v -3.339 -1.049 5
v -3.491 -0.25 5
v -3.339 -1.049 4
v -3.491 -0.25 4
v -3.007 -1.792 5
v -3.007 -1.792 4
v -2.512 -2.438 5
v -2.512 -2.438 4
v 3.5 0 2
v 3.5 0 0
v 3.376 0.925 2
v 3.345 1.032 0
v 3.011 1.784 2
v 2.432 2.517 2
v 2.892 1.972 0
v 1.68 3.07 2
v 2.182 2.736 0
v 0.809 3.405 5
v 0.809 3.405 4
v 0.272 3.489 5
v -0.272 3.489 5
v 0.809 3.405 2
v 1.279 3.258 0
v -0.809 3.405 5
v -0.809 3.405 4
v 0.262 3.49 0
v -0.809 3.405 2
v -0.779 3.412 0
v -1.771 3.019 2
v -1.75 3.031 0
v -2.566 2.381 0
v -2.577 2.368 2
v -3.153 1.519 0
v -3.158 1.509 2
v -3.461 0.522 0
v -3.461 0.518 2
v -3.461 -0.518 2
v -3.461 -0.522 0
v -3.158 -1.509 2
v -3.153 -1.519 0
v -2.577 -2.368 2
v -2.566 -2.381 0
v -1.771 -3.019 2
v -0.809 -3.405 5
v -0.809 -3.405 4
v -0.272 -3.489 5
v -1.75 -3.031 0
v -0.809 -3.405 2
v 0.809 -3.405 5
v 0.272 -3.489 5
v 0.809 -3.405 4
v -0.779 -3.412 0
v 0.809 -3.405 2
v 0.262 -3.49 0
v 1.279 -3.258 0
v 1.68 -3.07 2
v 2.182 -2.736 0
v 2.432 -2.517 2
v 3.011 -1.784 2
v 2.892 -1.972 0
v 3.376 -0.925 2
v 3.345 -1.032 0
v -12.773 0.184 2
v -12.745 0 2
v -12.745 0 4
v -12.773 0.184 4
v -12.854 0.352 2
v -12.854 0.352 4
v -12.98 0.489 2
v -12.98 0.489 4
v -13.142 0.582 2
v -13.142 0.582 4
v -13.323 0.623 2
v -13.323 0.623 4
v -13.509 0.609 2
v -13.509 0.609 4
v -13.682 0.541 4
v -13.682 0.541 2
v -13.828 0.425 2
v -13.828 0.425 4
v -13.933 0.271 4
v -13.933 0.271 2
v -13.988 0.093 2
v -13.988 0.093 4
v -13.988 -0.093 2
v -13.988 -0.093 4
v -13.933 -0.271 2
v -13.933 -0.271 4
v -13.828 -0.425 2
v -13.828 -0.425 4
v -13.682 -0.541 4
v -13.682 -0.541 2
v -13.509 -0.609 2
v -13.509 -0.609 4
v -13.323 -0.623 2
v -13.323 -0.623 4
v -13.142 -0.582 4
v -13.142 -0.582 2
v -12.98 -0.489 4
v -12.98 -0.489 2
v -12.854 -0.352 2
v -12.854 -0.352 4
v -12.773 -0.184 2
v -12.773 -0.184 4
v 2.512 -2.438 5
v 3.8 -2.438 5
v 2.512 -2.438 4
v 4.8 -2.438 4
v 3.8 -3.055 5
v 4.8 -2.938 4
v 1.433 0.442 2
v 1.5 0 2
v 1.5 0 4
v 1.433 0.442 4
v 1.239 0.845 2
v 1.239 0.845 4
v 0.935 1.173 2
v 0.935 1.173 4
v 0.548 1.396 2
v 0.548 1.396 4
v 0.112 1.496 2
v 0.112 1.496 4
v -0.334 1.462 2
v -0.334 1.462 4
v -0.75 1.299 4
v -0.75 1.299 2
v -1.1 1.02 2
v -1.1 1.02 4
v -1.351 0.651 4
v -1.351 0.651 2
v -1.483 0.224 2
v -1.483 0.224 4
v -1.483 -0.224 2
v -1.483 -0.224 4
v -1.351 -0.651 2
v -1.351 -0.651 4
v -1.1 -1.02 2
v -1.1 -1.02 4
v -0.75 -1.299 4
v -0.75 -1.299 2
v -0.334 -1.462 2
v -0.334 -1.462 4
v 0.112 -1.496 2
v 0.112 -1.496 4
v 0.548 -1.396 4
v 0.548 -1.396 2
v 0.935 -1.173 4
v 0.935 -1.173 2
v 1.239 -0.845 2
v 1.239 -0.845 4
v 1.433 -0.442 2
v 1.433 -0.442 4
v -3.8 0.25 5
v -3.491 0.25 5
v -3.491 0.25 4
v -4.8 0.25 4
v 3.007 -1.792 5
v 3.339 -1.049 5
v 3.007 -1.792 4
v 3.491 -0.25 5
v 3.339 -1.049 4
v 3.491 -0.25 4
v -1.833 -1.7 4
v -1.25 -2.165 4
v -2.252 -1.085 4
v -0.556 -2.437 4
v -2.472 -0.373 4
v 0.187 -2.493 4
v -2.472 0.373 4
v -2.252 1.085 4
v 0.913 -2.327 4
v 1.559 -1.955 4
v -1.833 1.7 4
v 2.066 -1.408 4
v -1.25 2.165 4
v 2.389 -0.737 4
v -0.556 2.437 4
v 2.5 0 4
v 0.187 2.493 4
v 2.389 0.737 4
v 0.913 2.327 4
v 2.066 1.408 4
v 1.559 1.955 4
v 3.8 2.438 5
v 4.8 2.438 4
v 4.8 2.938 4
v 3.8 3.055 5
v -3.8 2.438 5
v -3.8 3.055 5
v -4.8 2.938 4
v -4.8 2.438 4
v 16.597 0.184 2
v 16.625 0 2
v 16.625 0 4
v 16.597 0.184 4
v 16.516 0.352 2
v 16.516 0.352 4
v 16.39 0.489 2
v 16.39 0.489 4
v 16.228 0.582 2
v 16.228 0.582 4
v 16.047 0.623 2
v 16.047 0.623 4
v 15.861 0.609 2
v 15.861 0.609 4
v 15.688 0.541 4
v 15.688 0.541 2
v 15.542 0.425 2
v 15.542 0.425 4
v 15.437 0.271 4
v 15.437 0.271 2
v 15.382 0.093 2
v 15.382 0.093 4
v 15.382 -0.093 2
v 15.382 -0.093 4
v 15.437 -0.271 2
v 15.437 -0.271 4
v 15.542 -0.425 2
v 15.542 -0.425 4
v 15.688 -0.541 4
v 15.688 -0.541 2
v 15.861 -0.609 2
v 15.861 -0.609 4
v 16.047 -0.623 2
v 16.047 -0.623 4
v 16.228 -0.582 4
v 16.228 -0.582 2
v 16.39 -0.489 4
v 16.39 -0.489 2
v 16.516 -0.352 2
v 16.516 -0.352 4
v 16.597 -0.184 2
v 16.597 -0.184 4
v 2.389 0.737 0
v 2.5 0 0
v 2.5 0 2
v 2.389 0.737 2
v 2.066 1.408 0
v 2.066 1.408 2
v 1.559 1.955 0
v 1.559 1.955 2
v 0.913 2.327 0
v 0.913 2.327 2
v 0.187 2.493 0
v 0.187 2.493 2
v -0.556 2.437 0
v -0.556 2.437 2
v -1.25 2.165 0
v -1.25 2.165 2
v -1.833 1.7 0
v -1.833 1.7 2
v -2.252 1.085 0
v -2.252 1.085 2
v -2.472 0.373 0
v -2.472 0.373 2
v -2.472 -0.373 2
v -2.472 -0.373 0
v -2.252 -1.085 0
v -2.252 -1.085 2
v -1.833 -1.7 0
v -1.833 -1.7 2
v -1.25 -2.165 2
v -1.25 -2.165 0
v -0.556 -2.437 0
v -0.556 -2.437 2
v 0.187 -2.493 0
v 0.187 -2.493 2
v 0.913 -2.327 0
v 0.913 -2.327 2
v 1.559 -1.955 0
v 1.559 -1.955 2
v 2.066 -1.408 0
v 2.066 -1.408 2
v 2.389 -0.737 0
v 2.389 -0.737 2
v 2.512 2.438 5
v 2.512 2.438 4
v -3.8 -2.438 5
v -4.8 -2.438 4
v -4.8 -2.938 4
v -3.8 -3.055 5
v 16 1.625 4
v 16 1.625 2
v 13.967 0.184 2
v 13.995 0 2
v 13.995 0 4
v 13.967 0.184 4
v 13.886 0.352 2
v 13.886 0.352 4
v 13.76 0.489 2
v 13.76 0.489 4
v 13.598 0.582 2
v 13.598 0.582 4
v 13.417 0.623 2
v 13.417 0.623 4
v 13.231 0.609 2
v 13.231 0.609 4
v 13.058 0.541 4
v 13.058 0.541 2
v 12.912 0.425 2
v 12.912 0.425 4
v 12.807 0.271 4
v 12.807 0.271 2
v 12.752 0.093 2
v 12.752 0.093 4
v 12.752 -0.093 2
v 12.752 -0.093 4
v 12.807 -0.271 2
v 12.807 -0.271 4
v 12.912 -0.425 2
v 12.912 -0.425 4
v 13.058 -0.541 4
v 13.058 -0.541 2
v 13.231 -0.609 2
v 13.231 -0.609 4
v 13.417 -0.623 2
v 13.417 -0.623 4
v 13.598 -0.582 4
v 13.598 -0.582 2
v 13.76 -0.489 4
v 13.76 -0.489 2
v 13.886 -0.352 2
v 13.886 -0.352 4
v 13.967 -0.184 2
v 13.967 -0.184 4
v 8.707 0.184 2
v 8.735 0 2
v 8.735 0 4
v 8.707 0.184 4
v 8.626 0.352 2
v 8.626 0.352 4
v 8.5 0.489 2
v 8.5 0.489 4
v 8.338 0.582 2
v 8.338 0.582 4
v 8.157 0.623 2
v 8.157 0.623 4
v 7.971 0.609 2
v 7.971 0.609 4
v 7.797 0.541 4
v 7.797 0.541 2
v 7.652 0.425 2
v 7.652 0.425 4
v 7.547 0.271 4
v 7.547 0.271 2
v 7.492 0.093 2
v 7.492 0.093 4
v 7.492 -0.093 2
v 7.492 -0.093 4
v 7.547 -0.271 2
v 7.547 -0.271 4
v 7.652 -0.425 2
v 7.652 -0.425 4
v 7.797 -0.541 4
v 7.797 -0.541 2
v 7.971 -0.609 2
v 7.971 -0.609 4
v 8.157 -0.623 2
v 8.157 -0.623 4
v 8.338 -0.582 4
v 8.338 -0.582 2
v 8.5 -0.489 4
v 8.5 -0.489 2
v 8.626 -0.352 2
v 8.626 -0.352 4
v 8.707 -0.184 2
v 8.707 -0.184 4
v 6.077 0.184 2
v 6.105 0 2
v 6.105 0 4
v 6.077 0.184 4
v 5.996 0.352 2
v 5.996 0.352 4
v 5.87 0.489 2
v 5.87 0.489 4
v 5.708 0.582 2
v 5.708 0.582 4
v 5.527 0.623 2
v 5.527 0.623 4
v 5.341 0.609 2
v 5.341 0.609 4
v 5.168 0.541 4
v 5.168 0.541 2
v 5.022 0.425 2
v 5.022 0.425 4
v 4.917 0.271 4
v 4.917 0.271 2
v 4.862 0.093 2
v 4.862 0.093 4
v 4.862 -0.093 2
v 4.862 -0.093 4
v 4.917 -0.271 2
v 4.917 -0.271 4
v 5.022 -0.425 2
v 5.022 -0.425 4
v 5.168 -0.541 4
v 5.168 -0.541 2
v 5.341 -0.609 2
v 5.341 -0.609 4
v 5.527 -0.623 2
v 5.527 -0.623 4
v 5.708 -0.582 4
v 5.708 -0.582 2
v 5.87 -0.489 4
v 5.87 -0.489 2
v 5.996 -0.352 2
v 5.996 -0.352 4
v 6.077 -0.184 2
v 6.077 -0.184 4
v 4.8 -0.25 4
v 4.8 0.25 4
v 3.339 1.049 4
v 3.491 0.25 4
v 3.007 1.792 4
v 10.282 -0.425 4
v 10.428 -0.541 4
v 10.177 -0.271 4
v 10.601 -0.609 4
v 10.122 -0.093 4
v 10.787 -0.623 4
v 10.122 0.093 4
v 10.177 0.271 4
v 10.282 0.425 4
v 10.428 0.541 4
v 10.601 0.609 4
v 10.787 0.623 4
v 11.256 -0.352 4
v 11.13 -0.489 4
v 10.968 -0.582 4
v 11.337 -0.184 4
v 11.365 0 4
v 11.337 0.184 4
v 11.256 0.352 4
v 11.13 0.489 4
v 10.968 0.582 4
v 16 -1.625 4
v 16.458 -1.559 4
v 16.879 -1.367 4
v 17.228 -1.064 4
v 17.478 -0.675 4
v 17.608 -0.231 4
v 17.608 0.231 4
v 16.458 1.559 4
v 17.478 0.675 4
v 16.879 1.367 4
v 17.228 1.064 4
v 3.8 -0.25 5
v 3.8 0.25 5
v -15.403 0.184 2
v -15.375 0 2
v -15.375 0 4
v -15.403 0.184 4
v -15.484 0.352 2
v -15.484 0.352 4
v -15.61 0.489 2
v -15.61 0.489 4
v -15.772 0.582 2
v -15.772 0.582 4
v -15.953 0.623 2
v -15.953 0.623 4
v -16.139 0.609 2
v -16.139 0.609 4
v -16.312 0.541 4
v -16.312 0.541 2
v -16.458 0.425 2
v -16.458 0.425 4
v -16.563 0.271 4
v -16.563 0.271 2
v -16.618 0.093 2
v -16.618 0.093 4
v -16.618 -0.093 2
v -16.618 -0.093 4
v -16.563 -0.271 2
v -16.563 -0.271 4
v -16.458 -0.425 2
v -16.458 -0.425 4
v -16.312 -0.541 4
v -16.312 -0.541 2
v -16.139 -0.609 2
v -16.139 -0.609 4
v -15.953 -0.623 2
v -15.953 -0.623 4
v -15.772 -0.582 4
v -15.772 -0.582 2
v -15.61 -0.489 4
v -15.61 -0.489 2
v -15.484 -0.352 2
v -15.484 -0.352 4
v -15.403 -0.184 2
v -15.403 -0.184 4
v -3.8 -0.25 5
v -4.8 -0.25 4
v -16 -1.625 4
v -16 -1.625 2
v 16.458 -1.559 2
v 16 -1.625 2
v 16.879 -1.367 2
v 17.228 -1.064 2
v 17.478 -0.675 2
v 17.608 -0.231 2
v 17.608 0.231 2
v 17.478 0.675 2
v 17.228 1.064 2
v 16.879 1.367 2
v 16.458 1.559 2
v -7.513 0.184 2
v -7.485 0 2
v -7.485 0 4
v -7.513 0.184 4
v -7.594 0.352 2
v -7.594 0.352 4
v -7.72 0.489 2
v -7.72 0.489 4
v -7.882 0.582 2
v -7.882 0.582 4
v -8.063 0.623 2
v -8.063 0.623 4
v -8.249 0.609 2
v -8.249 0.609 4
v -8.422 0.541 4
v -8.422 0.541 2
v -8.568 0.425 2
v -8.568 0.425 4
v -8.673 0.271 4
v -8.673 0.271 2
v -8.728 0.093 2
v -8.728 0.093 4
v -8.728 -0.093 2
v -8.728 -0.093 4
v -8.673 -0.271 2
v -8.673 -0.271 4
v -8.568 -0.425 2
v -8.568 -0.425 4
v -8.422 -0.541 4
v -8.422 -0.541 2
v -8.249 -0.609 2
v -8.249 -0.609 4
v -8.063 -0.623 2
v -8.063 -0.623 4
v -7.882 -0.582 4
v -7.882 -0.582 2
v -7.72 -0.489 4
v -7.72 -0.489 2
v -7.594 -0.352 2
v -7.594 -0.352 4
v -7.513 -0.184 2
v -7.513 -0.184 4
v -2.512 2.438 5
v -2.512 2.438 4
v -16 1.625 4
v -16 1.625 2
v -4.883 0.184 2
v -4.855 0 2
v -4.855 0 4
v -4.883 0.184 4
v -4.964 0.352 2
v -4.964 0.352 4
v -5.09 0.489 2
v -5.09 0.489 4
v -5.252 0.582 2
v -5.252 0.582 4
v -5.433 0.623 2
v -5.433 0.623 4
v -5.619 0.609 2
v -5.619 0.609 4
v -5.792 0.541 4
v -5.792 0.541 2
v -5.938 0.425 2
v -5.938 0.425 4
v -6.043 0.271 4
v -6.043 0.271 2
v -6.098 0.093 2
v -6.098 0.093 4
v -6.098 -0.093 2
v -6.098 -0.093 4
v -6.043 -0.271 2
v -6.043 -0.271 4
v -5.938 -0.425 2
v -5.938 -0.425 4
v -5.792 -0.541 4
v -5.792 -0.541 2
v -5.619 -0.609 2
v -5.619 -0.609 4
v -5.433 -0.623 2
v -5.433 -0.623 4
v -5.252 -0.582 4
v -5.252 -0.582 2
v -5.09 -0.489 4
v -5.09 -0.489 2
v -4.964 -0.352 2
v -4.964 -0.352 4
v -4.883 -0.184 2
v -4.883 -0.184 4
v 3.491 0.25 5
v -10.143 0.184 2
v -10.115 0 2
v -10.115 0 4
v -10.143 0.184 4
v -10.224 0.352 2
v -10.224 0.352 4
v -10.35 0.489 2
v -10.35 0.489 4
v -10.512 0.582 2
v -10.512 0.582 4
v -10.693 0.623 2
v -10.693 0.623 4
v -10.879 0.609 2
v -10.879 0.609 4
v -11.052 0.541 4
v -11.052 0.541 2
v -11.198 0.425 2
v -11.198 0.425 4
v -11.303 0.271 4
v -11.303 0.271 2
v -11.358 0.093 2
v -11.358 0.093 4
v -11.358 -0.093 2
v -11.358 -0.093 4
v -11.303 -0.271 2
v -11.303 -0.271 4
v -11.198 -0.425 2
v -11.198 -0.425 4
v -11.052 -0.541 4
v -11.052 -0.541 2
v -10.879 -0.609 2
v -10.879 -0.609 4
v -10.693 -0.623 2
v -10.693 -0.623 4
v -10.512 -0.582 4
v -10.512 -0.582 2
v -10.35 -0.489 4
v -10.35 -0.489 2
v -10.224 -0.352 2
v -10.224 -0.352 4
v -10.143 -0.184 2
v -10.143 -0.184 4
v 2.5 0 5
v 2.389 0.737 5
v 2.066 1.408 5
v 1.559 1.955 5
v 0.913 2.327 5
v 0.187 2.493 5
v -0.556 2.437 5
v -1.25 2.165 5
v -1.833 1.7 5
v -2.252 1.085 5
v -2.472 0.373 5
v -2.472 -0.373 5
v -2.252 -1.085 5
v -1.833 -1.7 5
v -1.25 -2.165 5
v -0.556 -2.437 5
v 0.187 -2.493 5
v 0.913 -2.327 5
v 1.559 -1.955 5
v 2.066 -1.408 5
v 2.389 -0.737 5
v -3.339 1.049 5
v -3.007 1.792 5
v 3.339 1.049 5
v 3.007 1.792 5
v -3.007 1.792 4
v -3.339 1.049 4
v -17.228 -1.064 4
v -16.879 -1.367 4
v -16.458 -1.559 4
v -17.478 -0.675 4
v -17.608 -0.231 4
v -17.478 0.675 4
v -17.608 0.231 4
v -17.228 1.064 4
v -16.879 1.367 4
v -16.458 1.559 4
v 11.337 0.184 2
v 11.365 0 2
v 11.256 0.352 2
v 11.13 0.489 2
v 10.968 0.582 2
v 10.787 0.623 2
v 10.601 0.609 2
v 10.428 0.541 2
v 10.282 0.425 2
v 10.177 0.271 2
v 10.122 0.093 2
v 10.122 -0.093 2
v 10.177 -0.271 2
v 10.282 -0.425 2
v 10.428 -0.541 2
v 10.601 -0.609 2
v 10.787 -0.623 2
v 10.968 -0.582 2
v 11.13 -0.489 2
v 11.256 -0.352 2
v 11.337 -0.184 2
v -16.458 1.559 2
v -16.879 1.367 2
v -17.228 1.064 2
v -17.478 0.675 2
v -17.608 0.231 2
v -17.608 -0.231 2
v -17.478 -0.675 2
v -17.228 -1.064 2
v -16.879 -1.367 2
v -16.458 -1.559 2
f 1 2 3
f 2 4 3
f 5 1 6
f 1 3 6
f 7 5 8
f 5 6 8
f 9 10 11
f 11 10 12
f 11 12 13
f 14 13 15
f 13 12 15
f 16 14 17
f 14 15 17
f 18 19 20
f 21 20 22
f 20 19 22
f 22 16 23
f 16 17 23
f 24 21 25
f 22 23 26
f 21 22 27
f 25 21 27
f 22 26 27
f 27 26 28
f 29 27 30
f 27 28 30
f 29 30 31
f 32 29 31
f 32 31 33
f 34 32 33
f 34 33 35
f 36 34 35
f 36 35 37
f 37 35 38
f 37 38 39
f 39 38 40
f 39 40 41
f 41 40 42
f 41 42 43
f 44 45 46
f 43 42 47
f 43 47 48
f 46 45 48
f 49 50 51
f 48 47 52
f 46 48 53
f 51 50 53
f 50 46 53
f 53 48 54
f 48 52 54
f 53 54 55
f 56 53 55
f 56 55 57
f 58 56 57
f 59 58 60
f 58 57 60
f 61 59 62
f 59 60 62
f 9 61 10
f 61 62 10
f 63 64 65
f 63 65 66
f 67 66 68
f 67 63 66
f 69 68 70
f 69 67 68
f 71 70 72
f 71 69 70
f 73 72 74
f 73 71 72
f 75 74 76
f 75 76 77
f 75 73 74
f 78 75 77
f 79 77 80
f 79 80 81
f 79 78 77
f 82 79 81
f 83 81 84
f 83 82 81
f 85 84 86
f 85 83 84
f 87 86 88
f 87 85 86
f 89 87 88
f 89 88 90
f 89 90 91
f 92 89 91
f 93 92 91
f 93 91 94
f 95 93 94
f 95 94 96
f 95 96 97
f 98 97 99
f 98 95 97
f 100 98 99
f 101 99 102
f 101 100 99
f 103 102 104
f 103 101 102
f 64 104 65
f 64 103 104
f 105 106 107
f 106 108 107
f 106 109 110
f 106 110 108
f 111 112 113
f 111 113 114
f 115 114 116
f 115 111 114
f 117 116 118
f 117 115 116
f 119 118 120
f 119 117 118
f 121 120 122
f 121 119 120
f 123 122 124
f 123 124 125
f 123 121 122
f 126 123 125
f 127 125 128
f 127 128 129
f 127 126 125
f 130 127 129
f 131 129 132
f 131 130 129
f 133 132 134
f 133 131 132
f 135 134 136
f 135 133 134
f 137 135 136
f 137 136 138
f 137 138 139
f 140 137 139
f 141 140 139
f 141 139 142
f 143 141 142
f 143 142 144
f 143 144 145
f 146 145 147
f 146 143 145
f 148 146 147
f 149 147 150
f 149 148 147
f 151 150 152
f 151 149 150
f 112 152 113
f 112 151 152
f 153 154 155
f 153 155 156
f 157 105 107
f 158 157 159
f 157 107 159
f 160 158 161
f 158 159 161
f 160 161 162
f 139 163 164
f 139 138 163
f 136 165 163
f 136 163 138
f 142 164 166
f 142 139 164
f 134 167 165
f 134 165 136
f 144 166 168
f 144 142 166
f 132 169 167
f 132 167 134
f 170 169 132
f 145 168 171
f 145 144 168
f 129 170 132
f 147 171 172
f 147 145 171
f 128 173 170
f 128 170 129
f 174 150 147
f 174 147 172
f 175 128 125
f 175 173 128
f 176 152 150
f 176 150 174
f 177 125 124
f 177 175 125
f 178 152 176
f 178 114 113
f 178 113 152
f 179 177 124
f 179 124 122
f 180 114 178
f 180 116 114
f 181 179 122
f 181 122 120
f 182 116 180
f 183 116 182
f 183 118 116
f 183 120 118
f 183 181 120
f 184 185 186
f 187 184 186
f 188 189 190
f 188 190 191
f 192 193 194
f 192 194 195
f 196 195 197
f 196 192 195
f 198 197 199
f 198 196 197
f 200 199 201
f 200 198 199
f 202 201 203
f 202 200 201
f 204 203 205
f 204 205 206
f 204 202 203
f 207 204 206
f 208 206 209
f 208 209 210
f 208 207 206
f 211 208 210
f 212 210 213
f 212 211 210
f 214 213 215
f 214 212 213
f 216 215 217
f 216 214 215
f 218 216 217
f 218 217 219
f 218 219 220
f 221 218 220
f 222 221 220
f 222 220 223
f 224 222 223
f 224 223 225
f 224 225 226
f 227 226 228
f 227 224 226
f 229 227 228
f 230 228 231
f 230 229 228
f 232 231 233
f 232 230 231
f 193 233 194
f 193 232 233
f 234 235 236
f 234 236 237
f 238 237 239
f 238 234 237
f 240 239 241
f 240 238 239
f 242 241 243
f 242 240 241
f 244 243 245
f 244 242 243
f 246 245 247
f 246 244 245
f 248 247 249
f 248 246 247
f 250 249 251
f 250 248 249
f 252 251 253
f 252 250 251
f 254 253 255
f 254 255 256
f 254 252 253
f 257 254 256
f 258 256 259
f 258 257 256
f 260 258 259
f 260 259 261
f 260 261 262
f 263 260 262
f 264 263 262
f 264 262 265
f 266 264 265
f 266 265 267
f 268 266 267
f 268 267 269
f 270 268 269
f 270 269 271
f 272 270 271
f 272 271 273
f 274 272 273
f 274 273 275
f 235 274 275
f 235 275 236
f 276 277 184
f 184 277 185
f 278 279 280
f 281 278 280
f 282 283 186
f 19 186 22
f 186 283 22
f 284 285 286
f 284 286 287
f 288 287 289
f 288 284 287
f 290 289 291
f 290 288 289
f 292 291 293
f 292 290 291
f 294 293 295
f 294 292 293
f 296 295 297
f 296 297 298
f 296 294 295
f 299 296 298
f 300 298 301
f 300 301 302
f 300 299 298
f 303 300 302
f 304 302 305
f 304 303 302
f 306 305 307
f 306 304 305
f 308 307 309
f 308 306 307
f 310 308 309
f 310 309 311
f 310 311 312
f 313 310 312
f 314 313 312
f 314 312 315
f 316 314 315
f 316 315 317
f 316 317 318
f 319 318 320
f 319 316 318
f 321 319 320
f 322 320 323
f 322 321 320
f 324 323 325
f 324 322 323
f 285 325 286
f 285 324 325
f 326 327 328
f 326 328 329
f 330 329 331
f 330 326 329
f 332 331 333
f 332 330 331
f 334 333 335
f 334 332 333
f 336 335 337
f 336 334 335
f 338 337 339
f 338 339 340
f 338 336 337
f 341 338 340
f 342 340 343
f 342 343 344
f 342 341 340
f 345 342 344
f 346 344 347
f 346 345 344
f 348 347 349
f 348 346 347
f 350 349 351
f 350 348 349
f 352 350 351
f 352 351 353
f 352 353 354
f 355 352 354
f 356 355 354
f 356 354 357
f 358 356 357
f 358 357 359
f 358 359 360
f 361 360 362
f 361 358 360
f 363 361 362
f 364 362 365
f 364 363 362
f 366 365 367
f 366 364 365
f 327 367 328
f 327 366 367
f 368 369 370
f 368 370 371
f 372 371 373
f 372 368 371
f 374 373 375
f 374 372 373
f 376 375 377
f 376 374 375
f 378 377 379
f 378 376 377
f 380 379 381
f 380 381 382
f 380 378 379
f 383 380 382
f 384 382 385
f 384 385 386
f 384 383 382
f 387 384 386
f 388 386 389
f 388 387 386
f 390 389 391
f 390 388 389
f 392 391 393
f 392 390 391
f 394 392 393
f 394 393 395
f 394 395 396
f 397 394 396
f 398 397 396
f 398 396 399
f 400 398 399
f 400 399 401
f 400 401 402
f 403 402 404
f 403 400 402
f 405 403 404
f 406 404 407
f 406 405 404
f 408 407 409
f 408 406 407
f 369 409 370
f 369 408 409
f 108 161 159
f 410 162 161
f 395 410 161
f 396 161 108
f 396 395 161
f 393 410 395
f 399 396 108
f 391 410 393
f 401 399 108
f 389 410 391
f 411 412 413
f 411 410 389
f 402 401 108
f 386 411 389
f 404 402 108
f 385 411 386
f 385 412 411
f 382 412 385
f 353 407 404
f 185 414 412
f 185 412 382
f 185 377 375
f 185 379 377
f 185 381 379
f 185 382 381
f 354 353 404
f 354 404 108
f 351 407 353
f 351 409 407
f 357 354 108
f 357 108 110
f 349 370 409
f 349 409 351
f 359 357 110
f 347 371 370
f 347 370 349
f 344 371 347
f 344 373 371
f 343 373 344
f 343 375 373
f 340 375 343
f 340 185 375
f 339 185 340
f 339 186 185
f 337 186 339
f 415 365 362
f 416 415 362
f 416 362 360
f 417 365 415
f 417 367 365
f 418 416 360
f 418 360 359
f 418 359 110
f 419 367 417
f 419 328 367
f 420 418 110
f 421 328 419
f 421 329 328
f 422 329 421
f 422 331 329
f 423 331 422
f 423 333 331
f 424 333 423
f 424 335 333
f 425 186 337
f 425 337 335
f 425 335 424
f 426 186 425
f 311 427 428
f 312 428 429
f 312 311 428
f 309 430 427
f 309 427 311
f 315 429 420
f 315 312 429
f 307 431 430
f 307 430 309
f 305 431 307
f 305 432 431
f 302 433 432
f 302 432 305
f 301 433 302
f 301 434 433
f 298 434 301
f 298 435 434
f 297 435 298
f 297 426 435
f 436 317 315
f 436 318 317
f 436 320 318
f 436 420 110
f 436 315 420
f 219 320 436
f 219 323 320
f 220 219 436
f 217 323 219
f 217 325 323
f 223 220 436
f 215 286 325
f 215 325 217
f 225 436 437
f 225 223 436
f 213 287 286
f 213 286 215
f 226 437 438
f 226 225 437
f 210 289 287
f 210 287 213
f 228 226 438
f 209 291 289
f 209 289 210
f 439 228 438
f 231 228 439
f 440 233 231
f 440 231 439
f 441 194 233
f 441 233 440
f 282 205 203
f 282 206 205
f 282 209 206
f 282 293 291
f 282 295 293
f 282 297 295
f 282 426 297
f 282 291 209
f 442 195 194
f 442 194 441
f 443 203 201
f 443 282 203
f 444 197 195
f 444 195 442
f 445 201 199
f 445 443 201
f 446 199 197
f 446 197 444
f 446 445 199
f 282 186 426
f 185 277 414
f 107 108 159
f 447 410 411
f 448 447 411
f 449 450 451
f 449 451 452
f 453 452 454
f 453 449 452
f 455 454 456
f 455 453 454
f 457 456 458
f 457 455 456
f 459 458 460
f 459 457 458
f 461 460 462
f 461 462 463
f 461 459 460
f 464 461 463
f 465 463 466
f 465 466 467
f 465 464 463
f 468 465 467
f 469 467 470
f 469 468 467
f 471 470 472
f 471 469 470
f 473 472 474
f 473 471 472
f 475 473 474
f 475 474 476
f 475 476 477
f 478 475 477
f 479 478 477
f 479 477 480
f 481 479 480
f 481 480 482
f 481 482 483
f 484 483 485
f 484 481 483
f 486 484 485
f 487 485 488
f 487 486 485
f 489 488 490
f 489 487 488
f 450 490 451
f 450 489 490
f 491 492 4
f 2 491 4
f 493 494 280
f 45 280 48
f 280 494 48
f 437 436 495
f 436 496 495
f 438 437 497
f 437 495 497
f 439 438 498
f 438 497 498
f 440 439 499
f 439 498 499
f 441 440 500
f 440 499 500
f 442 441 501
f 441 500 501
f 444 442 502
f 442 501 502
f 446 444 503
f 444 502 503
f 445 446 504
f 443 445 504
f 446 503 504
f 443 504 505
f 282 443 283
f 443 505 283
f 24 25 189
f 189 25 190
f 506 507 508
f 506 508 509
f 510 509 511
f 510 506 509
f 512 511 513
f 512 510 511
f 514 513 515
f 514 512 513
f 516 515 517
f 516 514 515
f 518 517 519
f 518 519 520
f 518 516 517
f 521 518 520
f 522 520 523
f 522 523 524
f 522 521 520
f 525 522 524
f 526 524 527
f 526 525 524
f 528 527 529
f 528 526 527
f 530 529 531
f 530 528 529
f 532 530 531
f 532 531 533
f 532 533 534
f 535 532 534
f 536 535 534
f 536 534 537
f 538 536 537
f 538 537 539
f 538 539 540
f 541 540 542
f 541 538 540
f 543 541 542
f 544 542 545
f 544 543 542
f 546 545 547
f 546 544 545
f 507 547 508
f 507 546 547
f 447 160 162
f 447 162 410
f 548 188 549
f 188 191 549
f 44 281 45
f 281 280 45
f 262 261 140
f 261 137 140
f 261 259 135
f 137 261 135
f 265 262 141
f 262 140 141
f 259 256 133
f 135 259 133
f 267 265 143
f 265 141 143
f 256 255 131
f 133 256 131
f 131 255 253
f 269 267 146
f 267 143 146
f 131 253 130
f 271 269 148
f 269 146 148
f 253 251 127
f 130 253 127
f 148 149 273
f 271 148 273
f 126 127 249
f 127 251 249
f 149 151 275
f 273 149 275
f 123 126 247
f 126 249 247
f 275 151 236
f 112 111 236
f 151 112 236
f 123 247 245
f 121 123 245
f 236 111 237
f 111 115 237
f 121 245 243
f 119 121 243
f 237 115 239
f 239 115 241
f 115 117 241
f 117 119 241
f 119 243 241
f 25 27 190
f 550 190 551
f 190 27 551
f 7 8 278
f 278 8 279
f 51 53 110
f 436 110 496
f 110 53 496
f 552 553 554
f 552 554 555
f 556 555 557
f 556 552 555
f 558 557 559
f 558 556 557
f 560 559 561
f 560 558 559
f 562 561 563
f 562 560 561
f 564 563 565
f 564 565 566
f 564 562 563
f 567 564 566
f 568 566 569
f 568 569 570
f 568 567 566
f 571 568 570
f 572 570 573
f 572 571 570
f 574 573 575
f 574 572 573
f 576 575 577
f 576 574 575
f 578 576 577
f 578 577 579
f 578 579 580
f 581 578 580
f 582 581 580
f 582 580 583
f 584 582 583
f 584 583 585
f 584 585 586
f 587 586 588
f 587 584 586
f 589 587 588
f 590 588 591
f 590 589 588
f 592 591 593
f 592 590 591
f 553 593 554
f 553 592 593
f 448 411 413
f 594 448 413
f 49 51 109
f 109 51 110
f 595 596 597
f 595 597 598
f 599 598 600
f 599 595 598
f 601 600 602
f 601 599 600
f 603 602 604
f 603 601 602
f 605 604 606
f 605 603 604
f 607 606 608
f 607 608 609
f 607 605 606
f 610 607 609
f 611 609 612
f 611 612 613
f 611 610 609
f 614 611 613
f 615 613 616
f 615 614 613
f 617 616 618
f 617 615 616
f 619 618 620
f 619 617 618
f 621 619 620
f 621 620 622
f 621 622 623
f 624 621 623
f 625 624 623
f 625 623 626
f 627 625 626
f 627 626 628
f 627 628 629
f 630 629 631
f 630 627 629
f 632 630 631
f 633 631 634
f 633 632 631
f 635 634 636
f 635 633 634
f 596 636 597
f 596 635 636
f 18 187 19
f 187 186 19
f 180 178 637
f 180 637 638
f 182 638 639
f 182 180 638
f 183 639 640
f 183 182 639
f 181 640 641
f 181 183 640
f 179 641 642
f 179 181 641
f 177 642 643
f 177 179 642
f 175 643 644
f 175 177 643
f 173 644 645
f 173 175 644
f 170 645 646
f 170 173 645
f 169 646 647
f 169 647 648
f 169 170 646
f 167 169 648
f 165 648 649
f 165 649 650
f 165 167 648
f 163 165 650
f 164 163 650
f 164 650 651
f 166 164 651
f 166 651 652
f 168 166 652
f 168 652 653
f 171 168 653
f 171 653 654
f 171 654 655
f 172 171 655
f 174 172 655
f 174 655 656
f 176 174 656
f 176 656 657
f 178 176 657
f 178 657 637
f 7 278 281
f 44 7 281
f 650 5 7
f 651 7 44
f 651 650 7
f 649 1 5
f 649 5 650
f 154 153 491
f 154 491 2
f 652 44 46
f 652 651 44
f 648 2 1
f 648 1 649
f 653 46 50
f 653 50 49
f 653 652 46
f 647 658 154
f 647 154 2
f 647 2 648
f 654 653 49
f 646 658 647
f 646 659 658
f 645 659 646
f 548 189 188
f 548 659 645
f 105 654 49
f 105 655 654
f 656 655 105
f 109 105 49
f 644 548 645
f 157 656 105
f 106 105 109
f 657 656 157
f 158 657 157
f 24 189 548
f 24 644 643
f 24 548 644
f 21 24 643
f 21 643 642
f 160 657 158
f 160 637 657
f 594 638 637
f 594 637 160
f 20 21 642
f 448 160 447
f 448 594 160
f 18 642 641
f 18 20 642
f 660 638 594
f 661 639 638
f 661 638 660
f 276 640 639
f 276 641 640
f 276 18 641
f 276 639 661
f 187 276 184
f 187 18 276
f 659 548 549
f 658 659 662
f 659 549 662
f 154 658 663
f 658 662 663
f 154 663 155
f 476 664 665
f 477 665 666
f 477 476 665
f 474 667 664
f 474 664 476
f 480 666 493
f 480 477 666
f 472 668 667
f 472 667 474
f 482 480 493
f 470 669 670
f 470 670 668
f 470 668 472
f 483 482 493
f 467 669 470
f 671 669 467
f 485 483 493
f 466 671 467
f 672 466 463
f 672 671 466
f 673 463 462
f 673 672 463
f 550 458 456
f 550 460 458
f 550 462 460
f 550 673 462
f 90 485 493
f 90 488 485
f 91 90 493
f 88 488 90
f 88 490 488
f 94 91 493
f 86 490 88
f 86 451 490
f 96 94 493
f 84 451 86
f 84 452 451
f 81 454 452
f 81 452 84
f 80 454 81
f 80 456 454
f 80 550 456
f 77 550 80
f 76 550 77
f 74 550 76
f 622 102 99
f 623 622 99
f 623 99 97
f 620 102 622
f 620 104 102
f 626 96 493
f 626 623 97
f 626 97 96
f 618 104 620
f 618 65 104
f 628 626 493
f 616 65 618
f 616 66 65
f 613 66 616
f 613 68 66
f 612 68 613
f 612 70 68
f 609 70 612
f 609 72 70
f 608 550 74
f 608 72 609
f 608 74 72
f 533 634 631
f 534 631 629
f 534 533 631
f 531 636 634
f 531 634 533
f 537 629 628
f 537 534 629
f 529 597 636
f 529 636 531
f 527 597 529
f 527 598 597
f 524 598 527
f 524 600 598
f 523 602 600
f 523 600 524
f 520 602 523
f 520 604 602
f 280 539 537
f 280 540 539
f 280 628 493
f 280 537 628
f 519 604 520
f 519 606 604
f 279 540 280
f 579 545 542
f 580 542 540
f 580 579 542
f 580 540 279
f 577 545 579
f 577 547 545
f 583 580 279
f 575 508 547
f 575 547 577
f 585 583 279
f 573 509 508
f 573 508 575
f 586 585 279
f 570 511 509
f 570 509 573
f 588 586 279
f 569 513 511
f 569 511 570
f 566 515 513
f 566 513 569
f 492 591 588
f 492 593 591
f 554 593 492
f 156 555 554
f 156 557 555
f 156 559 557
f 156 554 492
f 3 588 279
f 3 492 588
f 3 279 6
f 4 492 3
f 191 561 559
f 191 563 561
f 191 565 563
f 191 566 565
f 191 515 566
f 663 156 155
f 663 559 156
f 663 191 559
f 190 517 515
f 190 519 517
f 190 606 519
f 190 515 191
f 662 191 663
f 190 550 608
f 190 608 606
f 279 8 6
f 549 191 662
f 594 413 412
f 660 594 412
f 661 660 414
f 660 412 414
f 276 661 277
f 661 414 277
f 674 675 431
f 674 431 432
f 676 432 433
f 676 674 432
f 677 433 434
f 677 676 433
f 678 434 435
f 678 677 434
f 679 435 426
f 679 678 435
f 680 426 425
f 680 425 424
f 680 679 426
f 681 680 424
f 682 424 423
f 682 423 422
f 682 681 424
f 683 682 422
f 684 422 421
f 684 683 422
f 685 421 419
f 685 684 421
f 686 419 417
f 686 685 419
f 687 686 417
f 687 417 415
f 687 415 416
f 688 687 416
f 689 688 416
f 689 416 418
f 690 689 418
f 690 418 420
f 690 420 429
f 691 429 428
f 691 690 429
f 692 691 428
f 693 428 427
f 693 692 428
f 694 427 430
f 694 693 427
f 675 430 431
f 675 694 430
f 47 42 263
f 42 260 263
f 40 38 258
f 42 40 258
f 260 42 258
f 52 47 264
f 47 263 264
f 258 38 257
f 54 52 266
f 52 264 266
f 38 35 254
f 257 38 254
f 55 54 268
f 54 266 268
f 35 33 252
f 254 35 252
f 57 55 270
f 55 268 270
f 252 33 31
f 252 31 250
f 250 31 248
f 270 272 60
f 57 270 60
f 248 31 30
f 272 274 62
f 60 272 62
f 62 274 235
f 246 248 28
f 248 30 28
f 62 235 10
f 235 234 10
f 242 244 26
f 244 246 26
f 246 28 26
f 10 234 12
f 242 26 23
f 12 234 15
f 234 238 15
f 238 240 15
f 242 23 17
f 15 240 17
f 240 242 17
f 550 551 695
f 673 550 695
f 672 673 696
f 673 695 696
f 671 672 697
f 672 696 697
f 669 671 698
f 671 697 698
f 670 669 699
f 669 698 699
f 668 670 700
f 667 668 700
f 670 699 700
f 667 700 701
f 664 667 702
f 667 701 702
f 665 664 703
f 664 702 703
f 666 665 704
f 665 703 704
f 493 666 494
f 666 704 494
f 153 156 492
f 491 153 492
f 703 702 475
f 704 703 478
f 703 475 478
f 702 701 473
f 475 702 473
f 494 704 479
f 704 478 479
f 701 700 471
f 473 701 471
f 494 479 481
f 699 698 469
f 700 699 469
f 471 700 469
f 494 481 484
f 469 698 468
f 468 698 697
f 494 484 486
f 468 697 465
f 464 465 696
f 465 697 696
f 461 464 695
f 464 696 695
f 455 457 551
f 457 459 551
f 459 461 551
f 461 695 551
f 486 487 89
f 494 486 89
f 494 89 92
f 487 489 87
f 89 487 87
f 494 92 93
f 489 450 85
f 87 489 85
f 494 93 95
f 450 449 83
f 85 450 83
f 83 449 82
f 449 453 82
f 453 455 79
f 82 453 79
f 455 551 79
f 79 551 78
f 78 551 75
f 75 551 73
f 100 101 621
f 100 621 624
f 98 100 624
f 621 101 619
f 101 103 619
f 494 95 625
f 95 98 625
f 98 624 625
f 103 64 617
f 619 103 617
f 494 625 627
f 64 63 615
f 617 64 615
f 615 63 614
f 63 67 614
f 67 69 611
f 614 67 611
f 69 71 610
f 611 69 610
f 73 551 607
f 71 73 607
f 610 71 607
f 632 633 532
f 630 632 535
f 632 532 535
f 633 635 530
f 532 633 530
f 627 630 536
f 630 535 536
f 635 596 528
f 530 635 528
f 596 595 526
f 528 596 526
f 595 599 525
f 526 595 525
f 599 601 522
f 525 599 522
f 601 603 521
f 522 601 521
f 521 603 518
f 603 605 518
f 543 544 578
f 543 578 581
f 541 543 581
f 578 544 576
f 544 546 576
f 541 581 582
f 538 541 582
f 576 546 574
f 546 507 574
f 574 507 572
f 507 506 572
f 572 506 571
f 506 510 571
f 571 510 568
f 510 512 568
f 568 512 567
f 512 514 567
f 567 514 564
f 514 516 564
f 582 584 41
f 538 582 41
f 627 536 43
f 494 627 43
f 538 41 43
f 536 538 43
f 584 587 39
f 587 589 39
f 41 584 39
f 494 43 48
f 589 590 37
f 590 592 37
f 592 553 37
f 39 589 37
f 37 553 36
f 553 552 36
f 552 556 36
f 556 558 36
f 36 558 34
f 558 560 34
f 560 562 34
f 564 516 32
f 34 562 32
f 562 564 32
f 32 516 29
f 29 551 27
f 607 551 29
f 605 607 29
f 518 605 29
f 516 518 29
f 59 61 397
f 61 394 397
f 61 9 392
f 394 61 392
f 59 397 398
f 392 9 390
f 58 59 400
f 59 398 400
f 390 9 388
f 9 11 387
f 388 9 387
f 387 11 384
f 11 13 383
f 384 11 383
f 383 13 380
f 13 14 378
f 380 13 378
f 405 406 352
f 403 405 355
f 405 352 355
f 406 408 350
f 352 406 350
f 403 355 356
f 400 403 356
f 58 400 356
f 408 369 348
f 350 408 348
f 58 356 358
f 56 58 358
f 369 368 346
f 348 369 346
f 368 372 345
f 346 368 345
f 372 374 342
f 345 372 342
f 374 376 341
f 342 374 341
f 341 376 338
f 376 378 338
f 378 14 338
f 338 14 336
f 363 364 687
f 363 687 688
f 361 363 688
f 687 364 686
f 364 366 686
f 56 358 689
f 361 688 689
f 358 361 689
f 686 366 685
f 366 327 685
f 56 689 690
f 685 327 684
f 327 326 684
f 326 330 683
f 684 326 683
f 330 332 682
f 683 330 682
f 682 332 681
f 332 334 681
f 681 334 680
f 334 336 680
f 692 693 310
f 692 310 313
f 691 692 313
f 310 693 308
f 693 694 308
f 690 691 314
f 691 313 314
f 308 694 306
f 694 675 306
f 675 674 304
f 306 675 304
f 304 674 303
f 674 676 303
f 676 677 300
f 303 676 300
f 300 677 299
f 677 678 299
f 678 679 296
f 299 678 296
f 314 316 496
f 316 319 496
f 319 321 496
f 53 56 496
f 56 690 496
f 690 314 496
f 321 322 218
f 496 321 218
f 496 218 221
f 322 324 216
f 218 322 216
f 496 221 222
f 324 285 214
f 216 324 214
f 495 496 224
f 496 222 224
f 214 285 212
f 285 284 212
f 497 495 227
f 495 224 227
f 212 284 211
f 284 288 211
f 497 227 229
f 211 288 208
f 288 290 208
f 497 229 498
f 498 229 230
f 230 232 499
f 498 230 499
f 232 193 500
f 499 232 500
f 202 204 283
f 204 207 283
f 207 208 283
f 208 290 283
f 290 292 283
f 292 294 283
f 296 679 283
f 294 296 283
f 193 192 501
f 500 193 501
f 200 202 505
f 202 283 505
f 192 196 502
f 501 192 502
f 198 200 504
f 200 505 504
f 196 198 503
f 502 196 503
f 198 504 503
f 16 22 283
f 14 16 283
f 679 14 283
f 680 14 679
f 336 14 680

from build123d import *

# Parameters (mm, degrees)
SKETCH_1_R      = 3.5
SKETCH_1_R_2    = 2.5
EXTRUDE_1_DEPTH = 5
EXTRUDE_START   = -3
SKETCH_2_R      = 0.625
SKETCH_2_R_2    = 1.625
SKETCH_2_R_3    = 2.5
SKETCH_2_R_4    = 1.5
EXTRUDE_2_DEPTH = 2
EXTRUDE_3_DEPTH = 1
CHAMFER_1_SIZE  = 1


with BuildPart() as part:
    # Эскиз1 → Бобышка-Вытянуть1 (new body)
    with BuildSketch(Plane.XY):
        Circle(SKETCH_1_R)
        Circle(SKETCH_1_R_2, mode=Mode.SUBTRACT)
    extrude(amount=EXTRUDE_1_DEPTH)

    # Эскиз2 → Бобышка-Вытянуть2 (add)
    # profile 1 of 5: a face of its own
    with BuildSketch(Plane.XY.offset(5).offset(EXTRUDE_START)):
        with BuildLine():
            Line((-0.809199831, 3.405171895), (-16, 1.625))
            ThreePointArc((-16, 1.625), (-14.850951481, 1.149048519), (-14.375, 0))
            ThreePointArc((-14.375, 0), (-14.850951481, -1.149048519), (-16, -1.625))
            Line((-16, -1.625), (-0.809199831, -3.405171895))
            ThreePointArc((-0.809199831, -3.405171895), (-3.5, 0), (-0.809199831, 3.405171895))
        make_face()
        with Locations((-13.37, 0)):
            Circle(SKETCH_2_R, mode=Mode.SUBTRACT)
        with Locations((-10.74, 0)):
            Circle(SKETCH_2_R, mode=Mode.SUBTRACT)
        with Locations((-8.11, 0)):
            Circle(SKETCH_2_R, mode=Mode.SUBTRACT)
        with Locations((-5.48, 0)):
            Circle(SKETCH_2_R, mode=Mode.SUBTRACT)
    # profile 2 of 5: a face of its own
    with BuildSketch(Plane.XY.offset(5).offset(EXTRUDE_START)):
        with Locations((-16, 0)):
            Circle(SKETCH_2_R_2)
        with Locations((-16, 0)):
            Circle(SKETCH_2_R, mode=Mode.SUBTRACT)
    # profile 3 of 5: a face of its own
    with BuildSketch(Plane.XY.offset(5).offset(EXTRUDE_START)):
        with BuildLine():
            Line((16, 1.625), (0.809199831, 3.405171895))
            ThreePointArc((0.809199831, 3.405171895), (2.746106281, 2.170000068), (3.5, 0))
            ThreePointArc((3.5, 0), (2.746106281, -2.170000068), (0.809199831, -3.405171895))
            Line((0.809199831, -3.405171895), (16, -1.625))
            ThreePointArc((16, -1.625), (14.375, 0), (16, 1.625))
        make_face()
        with Locations((5.48, 0)):
            Circle(SKETCH_2_R, mode=Mode.SUBTRACT)
        with Locations((8.11, 0)):
            Circle(SKETCH_2_R, mode=Mode.SUBTRACT)
        with Locations((10.74, 0)):
            Circle(SKETCH_2_R, mode=Mode.SUBTRACT)
        with Locations((13.37, 0)):
            Circle(SKETCH_2_R, mode=Mode.SUBTRACT)
    # profile 4 of 5: a face of its own
    with BuildSketch(Plane.XY.offset(5).offset(EXTRUDE_START)):
        with Locations((16, 0)):
            Circle(SKETCH_2_R_2)
        with Locations((16, 0)):
            Circle(SKETCH_2_R, mode=Mode.SUBTRACT)
    # profile 5 of 5: a face of its own
    with BuildSketch(Plane.XY.offset(5).offset(EXTRUDE_START)):
        Circle(SKETCH_2_R_3)
        Circle(SKETCH_2_R_4, mode=Mode.SUBTRACT)
    extrude(amount=EXTRUDE_2_DEPTH)

    # Эскиз3 → Бобышка-Вытянуть3 (add)
    with BuildSketch(Plane.XY.offset(4)):
        with BuildLine():
            ThreePointArc((-2.511691412, 2.4375), (-1.729501919, 3.04283143), (-0.809199831, 3.405171895))
            Line((-0.809199831, 3.405171895), (-4.8, 2.9375))
            Line((-4.8, 2.9375), (-4.8, 2.4375))
            Line((-4.8, 2.4375), (-2.511691412, 2.4375))
        make_face()
        with BuildLine():
            ThreePointArc((-3.491060011, -0.25), (-3.5, 0), (-3.491060011, 0.25))
            Line((-3.491060011, 0.25), (-4.8, 0.25))
            Line((-4.8, 0.25), (-4.8, -0.25))
            Line((-4.8, -0.25), (-3.491060011, -0.25))
        make_face()
        with BuildLine():
            ThreePointArc((-0.809199831, -3.405171895), (-1.729501919, -3.04283143), (-2.511691412, -2.4375))
            Line((-2.511691412, -2.4375), (-4.8, -2.4375))
            Line((-4.8, -2.4375), (-4.8, -2.9375))
            Line((-4.8, -2.9375), (-0.809199831, -3.405171895))
        make_face()
        with BuildLine():
            Line((4.8, -2.4375), (2.511691412, -2.4375))
            ThreePointArc((2.511691412, -2.4375), (1.729501919, -3.04283143), (0.809199831, -3.405171895))
            Line((0.809199831, -3.405171895), (4.8, -2.9375))
            Line((4.8, -2.9375), (4.8, -2.4375))
        make_face()
        with BuildLine():
            Line((4.8, 0.25), (3.491060011, 0.25))
            ThreePointArc((3.491060011, 0.25), (3.497764289, 0.125079898), (3.5, 0))
            ThreePointArc((3.5, 0), (3.497764289, -0.125079898), (3.491060011, -0.25))
            Line((3.491060011, -0.25), (4.8, -0.25))
            Line((4.8, -0.25), (4.8, 0.25))
        make_face()
        with BuildLine():
            Line((4.8, 2.9375), (0.809199831, 3.405171895))
            ThreePointArc((0.809199831, 3.405171895), (1.729501919, 3.04283143), (2.511691412, 2.4375))
            Line((2.511691412, 2.4375), (4.8, 2.4375))
            Line((4.8, 2.4375), (4.8, 2.9375))
        make_face()
    extrude(amount=EXTRUDE_3_DEPTH)

    # Фаска1
    chamfer_1_edges = [part.edges().sort_by_distance(p)[0] for p in [
        (4.8, 2.6875, 5),
        (4.8, 0, 5),
        (4.8, -2.6875, 5),
        (-4.8, -2.6875, 5),
        (-4.8, 0, 5),
        (-4.8, 2.6875, 5),
    ]]
    chamfer(chamfer_1_edges, length=CHAMFER_1_SIZE - 0.0001)  # a hair under: the kernel refuses the full size


solid = part.part
